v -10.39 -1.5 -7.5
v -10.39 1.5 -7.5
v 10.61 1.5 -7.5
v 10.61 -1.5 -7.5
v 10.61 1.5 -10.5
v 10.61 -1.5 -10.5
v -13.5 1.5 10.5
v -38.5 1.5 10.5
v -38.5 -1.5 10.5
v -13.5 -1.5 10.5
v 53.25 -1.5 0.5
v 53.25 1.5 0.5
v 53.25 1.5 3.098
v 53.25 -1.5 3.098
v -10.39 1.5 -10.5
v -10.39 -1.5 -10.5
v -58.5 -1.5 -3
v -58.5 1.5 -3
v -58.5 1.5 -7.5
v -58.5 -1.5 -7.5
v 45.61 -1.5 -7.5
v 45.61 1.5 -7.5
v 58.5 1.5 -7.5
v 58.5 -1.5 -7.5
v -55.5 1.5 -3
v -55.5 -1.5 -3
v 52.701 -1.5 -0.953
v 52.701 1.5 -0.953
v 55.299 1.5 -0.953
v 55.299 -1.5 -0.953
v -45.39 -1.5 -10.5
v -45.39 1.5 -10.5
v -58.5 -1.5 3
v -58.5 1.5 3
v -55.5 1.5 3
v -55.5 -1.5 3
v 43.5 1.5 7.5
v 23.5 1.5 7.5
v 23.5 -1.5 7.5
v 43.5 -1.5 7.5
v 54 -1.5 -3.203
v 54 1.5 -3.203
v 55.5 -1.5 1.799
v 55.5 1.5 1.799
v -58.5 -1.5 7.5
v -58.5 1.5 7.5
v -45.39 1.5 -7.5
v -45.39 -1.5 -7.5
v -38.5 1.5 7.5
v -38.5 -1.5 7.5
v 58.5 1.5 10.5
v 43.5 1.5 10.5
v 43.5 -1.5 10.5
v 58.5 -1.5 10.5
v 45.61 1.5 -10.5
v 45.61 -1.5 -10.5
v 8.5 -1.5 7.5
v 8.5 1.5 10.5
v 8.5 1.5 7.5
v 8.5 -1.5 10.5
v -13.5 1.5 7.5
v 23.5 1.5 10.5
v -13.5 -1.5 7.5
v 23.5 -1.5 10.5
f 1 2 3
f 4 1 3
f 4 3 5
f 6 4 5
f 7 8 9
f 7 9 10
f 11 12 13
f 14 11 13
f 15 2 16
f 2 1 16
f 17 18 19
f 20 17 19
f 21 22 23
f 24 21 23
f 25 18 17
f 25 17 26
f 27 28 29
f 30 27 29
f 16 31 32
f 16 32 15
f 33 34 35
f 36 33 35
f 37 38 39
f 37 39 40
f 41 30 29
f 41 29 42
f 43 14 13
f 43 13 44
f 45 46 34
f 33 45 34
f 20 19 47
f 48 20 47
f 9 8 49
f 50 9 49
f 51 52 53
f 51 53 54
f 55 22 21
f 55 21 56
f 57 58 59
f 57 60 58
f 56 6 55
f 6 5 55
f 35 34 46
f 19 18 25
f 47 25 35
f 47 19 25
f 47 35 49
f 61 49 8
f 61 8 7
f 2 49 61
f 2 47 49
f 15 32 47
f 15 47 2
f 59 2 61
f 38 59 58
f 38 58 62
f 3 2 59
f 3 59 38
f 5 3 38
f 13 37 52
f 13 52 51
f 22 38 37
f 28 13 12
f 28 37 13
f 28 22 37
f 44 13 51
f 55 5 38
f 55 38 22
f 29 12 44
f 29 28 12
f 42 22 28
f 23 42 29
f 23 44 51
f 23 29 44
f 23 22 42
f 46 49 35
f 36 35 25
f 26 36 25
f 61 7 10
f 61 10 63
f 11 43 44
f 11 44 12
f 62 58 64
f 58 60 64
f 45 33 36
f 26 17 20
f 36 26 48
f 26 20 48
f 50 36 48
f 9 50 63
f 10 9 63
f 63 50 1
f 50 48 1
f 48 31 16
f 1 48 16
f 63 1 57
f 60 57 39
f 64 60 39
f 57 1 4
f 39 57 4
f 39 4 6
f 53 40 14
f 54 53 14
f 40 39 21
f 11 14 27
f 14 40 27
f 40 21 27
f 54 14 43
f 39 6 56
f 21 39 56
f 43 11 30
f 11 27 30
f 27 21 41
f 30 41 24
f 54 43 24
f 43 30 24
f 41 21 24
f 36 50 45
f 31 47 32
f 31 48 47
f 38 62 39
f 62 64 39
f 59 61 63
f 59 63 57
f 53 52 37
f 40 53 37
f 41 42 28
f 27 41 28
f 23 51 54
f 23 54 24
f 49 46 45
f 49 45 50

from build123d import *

# Parameters (mm, degrees)
SKETCH1_W                = 117
SKETCH1_H                = 15
BOSS_EXTRUDE1_DEPTH      = 1.5
SKETCH2_W                = 15
SKETCH2_H                = 3
BOSS_EXTRUDE2_DEPTH      = 1.5
SKETCH12_W               = 25
SKETCH12_H               = 3
BOSS_EXTRUDE3_DEPTH      = 1.5
SKETCH13_W               = 35
SKETCH13_H               = 3
BOSS_EXTRUDE4_DEPTH      = 1.5
CUT_EXTRUDE10_DEPTH      = 2.5
CUT_EXTRUDE10_DEPTH_BACK = 2.5
SKETCH16_W               = 3
SKETCH16_H               = 6
CUT_EXTRUDE11_DEPTH      = 2.5
CUT_EXTRUDE11_DEPTH_BACK = 2.5


with BuildPart() as part:
    # Sketch1 → Boss-Extrude1 (new body, symmetric)
    with BuildSketch(Plane(origin=(0, 0, 0), x_dir=(1, 0, 0), z_dir=(0, 1, 0))):
        Rectangle(SKETCH1_W, SKETCH1_H)
    extrude(amount=BOSS_EXTRUDE1_DEPTH, both=True)

    # Sketch2 → Boss-Extrude2 (add, symmetric)
    with BuildSketch(Plane(origin=(0, 0, 0), x_dir=(1, 0, 0), z_dir=(0, 1, 0))):
        with Locations((16, -9)):
            Rectangle(SKETCH2_W, SKETCH2_H)
        with Locations((51, -9)):
            Rectangle(SKETCH2_W, SKETCH2_H)
    extrude(amount=BOSS_EXTRUDE2_DEPTH, both=True)

    # Sketch12 → Boss-Extrude3 (add, symmetric)
    with BuildSketch(Plane(origin=(0, 0, 0), x_dir=(1, 0, 0), z_dir=(0, 1, 0))):
        with Locations((-26, -9)):
            Rectangle(SKETCH12_W, SKETCH12_H)
    extrude(amount=BOSS_EXTRUDE3_DEPTH, both=True)

    # Sketch13 → Boss-Extrude4 (add, symmetric)
    with BuildSketch(Plane(origin=(0, 0, 0), x_dir=(1, 0, 0), z_dir=(0, 1, 0))):
        with Locations((-27.89, 9)):
            Rectangle(SKETCH13_W, SKETCH13_H)
        with Locations((28.11, 9)):
            Rectangle(SKETCH13_W, SKETCH13_H)
    extrude(amount=BOSS_EXTRUDE4_DEPTH, both=True)

    # Sketch15 → Cut-Extrude10 (cut, two sides)
    with BuildSketch(Plane(origin=(0, 0, 0), x_dir=(1, 0, 0), z_dir=(0, 1, 0))) as cut_extrude10_sk:
        Polygon((55.5, -1.799038106), (53.25, -0.5), (53.25, -3.098076211), align=None)
        Polygon((54, 3.202955396), (52.700961894, 0.952955396), (55.299038106, 0.952955396), align=None)
    extrude(amount=CUT_EXTRUDE10_DEPTH, mode=Mode.SUBTRACT)
    extrude(cut_extrude10_sk.sketch, amount=-CUT_EXTRUDE10_DEPTH_BACK, mode=Mode.SUBTRACT)

    # Sketch16 → Cut-Extrude11 (cut, two sides)
    with BuildSketch(Plane(origin=(0, 0, 0), x_dir=(1, 0, 0), z_dir=(0, 1, 0))) as cut_extrude11_sk:
        with Locations((-57, 0)):
            Rectangle(SKETCH16_W, SKETCH16_H)
    extrude(amount=CUT_EXTRUDE11_DEPTH, mode=Mode.SUBTRACT)
    extrude(cut_extrude11_sk.sketch, amount=-CUT_EXTRUDE11_DEPTH_BACK, mode=Mode.SUBTRACT)


solid = part.part
